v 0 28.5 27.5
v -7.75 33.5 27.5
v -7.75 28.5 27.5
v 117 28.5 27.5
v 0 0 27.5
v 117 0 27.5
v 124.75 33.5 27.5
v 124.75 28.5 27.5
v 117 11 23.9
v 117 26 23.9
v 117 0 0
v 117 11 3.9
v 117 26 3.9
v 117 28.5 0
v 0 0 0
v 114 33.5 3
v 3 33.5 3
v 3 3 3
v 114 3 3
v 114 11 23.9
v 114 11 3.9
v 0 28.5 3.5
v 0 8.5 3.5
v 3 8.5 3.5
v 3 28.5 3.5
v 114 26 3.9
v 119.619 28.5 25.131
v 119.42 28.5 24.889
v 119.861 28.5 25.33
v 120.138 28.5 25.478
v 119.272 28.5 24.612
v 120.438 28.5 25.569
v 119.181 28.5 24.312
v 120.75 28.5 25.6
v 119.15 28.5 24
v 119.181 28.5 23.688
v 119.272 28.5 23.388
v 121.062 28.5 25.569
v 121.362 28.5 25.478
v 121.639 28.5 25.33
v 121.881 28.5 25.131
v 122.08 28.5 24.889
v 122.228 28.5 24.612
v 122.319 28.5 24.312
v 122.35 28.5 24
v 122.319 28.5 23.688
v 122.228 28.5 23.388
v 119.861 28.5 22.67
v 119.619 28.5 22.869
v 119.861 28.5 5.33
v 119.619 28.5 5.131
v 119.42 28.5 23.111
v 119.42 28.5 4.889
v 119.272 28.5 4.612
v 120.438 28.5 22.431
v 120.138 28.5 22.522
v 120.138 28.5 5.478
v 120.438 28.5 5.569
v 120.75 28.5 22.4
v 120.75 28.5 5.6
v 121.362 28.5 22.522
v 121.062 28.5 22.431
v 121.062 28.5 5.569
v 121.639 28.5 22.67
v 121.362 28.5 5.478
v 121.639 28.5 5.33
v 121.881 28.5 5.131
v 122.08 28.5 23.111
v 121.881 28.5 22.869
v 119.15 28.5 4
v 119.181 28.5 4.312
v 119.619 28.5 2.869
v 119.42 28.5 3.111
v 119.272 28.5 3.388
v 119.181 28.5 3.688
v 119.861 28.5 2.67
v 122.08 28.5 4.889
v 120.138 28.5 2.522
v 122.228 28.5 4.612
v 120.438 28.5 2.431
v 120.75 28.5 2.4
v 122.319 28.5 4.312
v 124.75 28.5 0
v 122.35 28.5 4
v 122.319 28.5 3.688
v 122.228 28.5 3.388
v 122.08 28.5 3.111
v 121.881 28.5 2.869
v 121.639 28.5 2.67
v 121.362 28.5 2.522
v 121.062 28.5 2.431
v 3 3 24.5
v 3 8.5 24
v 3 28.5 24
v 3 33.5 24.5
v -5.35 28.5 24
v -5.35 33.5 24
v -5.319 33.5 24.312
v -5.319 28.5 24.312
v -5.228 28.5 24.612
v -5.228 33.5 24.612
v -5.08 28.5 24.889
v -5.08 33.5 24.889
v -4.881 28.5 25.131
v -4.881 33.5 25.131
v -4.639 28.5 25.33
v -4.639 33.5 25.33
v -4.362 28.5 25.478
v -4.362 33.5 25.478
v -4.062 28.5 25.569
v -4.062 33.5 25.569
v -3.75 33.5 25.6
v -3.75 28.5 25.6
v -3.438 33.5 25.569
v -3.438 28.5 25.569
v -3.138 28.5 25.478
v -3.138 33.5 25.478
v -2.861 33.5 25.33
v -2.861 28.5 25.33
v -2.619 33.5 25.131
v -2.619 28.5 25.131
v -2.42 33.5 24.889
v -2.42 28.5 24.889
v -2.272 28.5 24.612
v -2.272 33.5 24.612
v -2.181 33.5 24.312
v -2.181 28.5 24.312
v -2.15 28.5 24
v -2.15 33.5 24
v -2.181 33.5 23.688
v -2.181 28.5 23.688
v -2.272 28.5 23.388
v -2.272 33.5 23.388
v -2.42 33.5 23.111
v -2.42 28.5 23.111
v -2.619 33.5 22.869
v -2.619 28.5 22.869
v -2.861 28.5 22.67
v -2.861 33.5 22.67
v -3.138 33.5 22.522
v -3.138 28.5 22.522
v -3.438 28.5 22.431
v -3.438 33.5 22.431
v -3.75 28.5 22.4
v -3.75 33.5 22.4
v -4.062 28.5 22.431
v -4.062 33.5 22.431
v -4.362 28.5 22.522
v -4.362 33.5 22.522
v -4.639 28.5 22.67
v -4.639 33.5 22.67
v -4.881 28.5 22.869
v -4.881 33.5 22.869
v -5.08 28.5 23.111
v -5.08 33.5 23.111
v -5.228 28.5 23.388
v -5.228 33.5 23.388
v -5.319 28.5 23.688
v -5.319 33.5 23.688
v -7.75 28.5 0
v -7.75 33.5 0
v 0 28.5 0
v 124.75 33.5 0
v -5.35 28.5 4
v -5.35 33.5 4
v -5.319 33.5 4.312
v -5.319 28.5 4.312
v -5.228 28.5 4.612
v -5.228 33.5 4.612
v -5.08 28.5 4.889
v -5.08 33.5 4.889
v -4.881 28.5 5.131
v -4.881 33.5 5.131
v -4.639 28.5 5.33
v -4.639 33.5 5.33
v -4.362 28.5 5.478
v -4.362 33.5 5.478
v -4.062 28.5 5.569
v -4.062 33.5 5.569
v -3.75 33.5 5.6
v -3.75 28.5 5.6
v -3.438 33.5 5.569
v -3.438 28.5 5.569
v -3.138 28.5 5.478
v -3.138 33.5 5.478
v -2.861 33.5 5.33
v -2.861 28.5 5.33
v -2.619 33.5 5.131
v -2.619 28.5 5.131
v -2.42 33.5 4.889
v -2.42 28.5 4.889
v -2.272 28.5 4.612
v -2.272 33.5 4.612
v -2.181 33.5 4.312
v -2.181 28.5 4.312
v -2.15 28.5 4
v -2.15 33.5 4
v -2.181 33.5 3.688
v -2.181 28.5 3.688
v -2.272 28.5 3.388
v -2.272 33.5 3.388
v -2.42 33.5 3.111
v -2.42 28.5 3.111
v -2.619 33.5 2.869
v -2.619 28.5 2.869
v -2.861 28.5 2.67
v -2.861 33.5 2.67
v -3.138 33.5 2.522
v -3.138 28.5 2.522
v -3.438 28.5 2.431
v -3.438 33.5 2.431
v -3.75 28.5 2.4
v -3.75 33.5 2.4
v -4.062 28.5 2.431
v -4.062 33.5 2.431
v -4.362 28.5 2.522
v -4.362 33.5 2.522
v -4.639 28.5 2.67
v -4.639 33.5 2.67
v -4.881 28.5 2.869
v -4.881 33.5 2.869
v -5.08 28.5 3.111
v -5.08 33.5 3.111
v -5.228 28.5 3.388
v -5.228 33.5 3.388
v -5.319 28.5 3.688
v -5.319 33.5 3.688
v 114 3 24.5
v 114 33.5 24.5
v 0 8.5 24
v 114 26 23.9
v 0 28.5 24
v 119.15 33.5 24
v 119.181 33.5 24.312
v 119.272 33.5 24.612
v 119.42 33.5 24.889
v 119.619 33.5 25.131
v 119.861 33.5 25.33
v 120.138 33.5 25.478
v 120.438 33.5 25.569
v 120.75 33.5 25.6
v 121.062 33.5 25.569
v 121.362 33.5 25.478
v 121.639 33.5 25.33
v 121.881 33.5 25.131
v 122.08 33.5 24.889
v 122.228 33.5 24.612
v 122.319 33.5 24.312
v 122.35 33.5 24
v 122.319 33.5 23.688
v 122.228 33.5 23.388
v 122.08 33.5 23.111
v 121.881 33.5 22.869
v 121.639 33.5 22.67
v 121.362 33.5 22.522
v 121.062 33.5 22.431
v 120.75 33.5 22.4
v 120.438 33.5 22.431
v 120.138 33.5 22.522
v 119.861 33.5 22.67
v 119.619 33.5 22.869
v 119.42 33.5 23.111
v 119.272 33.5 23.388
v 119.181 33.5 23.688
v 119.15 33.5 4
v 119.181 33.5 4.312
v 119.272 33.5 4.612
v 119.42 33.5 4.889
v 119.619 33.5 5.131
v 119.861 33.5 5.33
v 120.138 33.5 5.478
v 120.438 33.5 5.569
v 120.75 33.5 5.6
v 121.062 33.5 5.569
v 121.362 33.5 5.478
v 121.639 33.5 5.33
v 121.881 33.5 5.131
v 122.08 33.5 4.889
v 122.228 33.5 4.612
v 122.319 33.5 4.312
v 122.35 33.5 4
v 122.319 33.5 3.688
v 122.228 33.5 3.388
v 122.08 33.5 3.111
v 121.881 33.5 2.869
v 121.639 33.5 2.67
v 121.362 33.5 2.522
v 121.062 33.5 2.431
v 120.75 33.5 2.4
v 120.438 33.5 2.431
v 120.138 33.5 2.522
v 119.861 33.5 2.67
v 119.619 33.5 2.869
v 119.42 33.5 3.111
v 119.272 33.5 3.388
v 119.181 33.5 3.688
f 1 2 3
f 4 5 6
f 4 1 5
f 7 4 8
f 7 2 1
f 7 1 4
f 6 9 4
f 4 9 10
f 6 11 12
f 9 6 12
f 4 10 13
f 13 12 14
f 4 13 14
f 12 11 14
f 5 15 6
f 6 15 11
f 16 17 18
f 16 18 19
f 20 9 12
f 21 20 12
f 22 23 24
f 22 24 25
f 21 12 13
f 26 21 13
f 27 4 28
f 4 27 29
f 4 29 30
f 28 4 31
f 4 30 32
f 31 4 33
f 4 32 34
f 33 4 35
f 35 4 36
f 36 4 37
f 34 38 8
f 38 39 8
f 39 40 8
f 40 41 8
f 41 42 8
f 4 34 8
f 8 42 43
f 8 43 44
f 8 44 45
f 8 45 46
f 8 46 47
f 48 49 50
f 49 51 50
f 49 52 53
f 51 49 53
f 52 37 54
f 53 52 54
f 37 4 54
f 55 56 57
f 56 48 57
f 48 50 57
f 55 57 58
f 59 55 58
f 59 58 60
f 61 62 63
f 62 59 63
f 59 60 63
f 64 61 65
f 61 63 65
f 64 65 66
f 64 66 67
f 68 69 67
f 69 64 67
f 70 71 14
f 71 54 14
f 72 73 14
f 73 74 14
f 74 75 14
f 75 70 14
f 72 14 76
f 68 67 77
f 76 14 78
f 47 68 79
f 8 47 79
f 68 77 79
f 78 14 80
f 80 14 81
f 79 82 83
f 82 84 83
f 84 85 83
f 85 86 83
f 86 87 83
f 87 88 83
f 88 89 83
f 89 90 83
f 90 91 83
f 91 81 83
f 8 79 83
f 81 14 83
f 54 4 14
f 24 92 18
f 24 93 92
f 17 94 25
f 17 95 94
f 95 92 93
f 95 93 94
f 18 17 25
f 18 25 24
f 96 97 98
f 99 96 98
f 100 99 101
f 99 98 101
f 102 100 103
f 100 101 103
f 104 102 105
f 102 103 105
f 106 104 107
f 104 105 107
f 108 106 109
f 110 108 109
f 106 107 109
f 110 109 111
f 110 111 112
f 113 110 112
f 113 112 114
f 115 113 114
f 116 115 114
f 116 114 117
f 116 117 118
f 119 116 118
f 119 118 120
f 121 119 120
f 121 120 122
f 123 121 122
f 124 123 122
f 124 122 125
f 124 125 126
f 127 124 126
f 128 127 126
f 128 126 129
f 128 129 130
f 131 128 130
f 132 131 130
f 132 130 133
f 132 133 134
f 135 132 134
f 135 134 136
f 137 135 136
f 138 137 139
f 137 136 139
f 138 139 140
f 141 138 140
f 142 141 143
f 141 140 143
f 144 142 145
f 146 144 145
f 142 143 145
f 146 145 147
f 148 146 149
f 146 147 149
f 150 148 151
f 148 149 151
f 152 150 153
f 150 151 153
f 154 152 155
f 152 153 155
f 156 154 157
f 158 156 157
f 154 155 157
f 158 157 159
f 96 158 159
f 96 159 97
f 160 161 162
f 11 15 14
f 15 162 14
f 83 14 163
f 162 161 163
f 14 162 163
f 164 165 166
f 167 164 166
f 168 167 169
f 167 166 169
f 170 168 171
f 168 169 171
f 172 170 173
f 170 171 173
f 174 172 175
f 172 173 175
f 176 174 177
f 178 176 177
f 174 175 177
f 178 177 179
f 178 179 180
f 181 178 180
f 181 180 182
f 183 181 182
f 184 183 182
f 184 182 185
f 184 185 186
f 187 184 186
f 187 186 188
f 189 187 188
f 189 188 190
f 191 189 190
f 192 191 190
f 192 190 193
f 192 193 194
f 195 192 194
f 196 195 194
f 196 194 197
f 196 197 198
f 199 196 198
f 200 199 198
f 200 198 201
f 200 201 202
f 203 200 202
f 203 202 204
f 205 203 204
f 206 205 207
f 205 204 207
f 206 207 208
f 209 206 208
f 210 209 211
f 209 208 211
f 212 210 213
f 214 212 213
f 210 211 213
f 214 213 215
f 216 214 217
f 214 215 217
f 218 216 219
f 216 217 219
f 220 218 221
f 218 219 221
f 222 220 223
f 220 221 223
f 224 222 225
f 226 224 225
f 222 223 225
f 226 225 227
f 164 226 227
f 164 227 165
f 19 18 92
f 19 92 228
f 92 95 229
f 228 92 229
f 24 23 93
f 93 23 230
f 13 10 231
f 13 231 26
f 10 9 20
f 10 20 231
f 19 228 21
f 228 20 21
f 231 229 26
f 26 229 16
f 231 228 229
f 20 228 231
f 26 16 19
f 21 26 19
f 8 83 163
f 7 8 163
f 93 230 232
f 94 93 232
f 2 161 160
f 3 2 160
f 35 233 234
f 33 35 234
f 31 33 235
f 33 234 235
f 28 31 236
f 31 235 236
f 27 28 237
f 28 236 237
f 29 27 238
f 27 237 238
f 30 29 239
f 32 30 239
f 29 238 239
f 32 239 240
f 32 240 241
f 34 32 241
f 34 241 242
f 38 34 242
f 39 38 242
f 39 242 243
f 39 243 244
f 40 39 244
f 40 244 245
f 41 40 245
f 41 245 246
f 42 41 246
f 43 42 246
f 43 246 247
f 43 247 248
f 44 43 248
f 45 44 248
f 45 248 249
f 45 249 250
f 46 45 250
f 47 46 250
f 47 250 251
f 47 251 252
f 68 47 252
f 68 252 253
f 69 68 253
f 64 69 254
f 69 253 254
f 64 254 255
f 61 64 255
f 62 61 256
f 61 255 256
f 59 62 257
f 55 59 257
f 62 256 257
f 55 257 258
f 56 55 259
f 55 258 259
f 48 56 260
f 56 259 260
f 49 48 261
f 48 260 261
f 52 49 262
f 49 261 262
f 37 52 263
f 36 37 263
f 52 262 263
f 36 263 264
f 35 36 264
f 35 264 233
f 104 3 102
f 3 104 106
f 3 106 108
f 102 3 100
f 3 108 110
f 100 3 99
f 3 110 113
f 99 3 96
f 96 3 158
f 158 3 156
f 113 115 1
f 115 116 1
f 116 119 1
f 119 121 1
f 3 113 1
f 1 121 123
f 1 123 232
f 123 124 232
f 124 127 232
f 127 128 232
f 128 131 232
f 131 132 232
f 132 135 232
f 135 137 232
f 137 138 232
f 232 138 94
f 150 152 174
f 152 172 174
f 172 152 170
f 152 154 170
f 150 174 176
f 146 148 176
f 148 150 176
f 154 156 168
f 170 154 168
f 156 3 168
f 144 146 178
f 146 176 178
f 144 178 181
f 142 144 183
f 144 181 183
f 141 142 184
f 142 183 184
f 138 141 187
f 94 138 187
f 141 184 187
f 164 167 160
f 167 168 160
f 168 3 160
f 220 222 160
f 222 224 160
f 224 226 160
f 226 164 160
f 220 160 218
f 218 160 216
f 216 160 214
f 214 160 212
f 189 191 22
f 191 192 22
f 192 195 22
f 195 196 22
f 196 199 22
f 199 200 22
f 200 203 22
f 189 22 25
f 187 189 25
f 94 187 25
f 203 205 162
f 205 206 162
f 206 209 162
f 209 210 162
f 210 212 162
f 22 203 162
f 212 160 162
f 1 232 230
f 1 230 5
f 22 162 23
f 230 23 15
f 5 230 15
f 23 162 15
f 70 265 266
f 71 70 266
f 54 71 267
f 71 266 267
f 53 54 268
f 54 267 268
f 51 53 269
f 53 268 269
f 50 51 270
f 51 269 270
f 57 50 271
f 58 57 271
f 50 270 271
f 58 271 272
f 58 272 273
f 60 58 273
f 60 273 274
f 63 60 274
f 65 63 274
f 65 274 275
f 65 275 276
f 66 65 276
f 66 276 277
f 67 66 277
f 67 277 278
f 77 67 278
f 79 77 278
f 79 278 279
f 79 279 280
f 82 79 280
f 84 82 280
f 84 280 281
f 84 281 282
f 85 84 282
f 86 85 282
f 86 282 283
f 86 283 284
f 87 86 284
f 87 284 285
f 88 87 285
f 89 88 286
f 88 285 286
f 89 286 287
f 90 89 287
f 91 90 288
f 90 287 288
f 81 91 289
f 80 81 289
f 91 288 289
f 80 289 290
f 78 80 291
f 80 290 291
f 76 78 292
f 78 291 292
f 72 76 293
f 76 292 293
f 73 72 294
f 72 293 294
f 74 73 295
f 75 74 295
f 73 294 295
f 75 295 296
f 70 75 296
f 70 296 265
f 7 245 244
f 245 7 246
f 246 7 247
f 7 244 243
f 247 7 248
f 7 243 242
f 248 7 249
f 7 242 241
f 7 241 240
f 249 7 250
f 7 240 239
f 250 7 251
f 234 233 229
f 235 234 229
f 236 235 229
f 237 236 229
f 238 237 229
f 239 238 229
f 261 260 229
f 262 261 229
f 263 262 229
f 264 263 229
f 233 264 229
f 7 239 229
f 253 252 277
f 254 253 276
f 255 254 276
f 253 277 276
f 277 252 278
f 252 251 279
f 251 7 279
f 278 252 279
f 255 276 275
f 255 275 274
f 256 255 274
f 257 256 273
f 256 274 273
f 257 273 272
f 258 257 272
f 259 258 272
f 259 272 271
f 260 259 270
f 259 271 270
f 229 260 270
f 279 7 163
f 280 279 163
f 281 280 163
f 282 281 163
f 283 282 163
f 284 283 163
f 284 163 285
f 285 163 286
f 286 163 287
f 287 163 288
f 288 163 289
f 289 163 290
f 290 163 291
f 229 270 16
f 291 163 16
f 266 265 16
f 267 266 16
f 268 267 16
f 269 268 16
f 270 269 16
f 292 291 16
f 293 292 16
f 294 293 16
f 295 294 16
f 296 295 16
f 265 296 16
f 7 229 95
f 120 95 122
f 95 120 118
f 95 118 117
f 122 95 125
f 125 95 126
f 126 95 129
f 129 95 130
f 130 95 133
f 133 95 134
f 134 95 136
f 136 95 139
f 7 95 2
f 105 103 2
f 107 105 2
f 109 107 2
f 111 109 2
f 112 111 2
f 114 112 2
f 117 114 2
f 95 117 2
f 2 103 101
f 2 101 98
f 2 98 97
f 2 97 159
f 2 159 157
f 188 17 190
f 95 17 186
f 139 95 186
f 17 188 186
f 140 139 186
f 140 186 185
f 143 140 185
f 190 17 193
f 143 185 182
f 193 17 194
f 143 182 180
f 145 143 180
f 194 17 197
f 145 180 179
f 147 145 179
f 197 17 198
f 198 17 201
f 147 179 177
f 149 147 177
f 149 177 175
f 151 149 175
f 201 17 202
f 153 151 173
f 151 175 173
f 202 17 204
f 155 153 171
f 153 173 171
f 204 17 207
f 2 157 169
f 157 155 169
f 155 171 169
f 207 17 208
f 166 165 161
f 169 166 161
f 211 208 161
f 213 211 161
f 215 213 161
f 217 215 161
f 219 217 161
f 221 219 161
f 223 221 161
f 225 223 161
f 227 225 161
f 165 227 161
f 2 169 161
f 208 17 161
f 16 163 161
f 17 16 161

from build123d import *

# Parameters (mm, degrees)
DODANIE_WYCI_GNI_CIE1_DEPTH = 27.5
SZKIC2_W                    = 111
SZKIC2_H                    = 21.5
WYTNIJ_WYCI_GNI_CIE1_DEPTH  = 30.5
SZKIC3_W                    = 20
SZKIC3_H                    = 15
WYTNIJ_WYCI_GNI_CIE2_DEPTH  = 3
SZKIC4_W                    = 20.5
SZKIC4_H                    = 20
WYTNIJ_WYCI_GNI_CIE3_DEPTH  = 3
SZKIC5_R                    = 1.6
WYTNIJ_WYCI_GNI_CIE4_DEPTH  = 133.064614867


with BuildPart() as part:
    # Szkic1 → Dodanie-wyciągnięcie1 (new body)
    with BuildSketch(Plane.XY):
        Polygon((0, 0), (117, 0), (117, 28.5), (124.75, 28.5), (124.75, 33.5), (-7.75, 33.5), (-7.75, 28.5), (0, 28.5), align=None)
    extrude(amount=DODANIE_WYCI_GNI_CIE1_DEPTH)

    # Szkic2 → Wytnij-wyciągnięcie1 (cut)
    with BuildSketch(Plane(origin=(0, 33.5, 0), x_dir=(1, 0, 0), z_dir=(0, 1, 0))):
        with Locations((58.5, -13.75)):
            Rectangle(SZKIC2_W, SZKIC2_H)
    extrude(amount=-WYTNIJ_WYCI_GNI_CIE1_DEPTH, mode=Mode.SUBTRACT)

    # Szkic3 → Wytnij-wyciągnięcie2 (cut)
    with BuildSketch(Plane(origin=(117, 0, 0), x_dir=(0, 0, -1), z_dir=(1, 0, 0))):
        with Locations((-13.9, 18.5)):
            Rectangle(SZKIC3_W, SZKIC3_H)
    extrude(amount=-WYTNIJ_WYCI_GNI_CIE2_DEPTH, mode=Mode.SUBTRACT)

    # Szkic4 → Wytnij-wyciągnięcie3 (cut)
    with BuildSketch(Plane.ZY):
        with Locations((13.75, 18.5)):
            Rectangle(SZKIC4_W, SZKIC4_H)
    extrude(amount=-WYTNIJ_WYCI_GNI_CIE3_DEPTH, mode=Mode.SUBTRACT)

    # Szkic5 → Wytnij-wyciągnięcie4 (cut, through all)
    with BuildSketch(Plane(origin=(0, 33.5, 0), x_dir=(1, 0, 0), z_dir=(0, 1, 0))):
        with Locations(Location((-3.75, -4, 0), (0, 0, 180))):
            Circle(SZKIC5_R)
        with Locations(Location((120.75, -4, 0), (0, 0, 180))):
            Circle(SZKIC5_R)
        with Locations(Location((120.75, -24, 0), (0, 0, 180))):
            Circle(SZKIC5_R)
        with Locations(Location((-3.75, -24, 0), (0, 0, 180))):
            Circle(SZKIC5_R)
    extrude(amount=-WYTNIJ_WYCI_GNI_CIE4_DEPTH, mode=Mode.SUBTRACT)


solid = part.part
